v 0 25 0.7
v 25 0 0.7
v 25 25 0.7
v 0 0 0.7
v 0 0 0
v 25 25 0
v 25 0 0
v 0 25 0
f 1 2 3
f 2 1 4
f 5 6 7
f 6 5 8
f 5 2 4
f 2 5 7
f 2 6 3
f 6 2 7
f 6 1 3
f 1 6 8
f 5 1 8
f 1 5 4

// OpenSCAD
resize([25, 0, 2], auto=true)
surface("qrcodeBW.png");
cube([25, 25, 0.7]);
